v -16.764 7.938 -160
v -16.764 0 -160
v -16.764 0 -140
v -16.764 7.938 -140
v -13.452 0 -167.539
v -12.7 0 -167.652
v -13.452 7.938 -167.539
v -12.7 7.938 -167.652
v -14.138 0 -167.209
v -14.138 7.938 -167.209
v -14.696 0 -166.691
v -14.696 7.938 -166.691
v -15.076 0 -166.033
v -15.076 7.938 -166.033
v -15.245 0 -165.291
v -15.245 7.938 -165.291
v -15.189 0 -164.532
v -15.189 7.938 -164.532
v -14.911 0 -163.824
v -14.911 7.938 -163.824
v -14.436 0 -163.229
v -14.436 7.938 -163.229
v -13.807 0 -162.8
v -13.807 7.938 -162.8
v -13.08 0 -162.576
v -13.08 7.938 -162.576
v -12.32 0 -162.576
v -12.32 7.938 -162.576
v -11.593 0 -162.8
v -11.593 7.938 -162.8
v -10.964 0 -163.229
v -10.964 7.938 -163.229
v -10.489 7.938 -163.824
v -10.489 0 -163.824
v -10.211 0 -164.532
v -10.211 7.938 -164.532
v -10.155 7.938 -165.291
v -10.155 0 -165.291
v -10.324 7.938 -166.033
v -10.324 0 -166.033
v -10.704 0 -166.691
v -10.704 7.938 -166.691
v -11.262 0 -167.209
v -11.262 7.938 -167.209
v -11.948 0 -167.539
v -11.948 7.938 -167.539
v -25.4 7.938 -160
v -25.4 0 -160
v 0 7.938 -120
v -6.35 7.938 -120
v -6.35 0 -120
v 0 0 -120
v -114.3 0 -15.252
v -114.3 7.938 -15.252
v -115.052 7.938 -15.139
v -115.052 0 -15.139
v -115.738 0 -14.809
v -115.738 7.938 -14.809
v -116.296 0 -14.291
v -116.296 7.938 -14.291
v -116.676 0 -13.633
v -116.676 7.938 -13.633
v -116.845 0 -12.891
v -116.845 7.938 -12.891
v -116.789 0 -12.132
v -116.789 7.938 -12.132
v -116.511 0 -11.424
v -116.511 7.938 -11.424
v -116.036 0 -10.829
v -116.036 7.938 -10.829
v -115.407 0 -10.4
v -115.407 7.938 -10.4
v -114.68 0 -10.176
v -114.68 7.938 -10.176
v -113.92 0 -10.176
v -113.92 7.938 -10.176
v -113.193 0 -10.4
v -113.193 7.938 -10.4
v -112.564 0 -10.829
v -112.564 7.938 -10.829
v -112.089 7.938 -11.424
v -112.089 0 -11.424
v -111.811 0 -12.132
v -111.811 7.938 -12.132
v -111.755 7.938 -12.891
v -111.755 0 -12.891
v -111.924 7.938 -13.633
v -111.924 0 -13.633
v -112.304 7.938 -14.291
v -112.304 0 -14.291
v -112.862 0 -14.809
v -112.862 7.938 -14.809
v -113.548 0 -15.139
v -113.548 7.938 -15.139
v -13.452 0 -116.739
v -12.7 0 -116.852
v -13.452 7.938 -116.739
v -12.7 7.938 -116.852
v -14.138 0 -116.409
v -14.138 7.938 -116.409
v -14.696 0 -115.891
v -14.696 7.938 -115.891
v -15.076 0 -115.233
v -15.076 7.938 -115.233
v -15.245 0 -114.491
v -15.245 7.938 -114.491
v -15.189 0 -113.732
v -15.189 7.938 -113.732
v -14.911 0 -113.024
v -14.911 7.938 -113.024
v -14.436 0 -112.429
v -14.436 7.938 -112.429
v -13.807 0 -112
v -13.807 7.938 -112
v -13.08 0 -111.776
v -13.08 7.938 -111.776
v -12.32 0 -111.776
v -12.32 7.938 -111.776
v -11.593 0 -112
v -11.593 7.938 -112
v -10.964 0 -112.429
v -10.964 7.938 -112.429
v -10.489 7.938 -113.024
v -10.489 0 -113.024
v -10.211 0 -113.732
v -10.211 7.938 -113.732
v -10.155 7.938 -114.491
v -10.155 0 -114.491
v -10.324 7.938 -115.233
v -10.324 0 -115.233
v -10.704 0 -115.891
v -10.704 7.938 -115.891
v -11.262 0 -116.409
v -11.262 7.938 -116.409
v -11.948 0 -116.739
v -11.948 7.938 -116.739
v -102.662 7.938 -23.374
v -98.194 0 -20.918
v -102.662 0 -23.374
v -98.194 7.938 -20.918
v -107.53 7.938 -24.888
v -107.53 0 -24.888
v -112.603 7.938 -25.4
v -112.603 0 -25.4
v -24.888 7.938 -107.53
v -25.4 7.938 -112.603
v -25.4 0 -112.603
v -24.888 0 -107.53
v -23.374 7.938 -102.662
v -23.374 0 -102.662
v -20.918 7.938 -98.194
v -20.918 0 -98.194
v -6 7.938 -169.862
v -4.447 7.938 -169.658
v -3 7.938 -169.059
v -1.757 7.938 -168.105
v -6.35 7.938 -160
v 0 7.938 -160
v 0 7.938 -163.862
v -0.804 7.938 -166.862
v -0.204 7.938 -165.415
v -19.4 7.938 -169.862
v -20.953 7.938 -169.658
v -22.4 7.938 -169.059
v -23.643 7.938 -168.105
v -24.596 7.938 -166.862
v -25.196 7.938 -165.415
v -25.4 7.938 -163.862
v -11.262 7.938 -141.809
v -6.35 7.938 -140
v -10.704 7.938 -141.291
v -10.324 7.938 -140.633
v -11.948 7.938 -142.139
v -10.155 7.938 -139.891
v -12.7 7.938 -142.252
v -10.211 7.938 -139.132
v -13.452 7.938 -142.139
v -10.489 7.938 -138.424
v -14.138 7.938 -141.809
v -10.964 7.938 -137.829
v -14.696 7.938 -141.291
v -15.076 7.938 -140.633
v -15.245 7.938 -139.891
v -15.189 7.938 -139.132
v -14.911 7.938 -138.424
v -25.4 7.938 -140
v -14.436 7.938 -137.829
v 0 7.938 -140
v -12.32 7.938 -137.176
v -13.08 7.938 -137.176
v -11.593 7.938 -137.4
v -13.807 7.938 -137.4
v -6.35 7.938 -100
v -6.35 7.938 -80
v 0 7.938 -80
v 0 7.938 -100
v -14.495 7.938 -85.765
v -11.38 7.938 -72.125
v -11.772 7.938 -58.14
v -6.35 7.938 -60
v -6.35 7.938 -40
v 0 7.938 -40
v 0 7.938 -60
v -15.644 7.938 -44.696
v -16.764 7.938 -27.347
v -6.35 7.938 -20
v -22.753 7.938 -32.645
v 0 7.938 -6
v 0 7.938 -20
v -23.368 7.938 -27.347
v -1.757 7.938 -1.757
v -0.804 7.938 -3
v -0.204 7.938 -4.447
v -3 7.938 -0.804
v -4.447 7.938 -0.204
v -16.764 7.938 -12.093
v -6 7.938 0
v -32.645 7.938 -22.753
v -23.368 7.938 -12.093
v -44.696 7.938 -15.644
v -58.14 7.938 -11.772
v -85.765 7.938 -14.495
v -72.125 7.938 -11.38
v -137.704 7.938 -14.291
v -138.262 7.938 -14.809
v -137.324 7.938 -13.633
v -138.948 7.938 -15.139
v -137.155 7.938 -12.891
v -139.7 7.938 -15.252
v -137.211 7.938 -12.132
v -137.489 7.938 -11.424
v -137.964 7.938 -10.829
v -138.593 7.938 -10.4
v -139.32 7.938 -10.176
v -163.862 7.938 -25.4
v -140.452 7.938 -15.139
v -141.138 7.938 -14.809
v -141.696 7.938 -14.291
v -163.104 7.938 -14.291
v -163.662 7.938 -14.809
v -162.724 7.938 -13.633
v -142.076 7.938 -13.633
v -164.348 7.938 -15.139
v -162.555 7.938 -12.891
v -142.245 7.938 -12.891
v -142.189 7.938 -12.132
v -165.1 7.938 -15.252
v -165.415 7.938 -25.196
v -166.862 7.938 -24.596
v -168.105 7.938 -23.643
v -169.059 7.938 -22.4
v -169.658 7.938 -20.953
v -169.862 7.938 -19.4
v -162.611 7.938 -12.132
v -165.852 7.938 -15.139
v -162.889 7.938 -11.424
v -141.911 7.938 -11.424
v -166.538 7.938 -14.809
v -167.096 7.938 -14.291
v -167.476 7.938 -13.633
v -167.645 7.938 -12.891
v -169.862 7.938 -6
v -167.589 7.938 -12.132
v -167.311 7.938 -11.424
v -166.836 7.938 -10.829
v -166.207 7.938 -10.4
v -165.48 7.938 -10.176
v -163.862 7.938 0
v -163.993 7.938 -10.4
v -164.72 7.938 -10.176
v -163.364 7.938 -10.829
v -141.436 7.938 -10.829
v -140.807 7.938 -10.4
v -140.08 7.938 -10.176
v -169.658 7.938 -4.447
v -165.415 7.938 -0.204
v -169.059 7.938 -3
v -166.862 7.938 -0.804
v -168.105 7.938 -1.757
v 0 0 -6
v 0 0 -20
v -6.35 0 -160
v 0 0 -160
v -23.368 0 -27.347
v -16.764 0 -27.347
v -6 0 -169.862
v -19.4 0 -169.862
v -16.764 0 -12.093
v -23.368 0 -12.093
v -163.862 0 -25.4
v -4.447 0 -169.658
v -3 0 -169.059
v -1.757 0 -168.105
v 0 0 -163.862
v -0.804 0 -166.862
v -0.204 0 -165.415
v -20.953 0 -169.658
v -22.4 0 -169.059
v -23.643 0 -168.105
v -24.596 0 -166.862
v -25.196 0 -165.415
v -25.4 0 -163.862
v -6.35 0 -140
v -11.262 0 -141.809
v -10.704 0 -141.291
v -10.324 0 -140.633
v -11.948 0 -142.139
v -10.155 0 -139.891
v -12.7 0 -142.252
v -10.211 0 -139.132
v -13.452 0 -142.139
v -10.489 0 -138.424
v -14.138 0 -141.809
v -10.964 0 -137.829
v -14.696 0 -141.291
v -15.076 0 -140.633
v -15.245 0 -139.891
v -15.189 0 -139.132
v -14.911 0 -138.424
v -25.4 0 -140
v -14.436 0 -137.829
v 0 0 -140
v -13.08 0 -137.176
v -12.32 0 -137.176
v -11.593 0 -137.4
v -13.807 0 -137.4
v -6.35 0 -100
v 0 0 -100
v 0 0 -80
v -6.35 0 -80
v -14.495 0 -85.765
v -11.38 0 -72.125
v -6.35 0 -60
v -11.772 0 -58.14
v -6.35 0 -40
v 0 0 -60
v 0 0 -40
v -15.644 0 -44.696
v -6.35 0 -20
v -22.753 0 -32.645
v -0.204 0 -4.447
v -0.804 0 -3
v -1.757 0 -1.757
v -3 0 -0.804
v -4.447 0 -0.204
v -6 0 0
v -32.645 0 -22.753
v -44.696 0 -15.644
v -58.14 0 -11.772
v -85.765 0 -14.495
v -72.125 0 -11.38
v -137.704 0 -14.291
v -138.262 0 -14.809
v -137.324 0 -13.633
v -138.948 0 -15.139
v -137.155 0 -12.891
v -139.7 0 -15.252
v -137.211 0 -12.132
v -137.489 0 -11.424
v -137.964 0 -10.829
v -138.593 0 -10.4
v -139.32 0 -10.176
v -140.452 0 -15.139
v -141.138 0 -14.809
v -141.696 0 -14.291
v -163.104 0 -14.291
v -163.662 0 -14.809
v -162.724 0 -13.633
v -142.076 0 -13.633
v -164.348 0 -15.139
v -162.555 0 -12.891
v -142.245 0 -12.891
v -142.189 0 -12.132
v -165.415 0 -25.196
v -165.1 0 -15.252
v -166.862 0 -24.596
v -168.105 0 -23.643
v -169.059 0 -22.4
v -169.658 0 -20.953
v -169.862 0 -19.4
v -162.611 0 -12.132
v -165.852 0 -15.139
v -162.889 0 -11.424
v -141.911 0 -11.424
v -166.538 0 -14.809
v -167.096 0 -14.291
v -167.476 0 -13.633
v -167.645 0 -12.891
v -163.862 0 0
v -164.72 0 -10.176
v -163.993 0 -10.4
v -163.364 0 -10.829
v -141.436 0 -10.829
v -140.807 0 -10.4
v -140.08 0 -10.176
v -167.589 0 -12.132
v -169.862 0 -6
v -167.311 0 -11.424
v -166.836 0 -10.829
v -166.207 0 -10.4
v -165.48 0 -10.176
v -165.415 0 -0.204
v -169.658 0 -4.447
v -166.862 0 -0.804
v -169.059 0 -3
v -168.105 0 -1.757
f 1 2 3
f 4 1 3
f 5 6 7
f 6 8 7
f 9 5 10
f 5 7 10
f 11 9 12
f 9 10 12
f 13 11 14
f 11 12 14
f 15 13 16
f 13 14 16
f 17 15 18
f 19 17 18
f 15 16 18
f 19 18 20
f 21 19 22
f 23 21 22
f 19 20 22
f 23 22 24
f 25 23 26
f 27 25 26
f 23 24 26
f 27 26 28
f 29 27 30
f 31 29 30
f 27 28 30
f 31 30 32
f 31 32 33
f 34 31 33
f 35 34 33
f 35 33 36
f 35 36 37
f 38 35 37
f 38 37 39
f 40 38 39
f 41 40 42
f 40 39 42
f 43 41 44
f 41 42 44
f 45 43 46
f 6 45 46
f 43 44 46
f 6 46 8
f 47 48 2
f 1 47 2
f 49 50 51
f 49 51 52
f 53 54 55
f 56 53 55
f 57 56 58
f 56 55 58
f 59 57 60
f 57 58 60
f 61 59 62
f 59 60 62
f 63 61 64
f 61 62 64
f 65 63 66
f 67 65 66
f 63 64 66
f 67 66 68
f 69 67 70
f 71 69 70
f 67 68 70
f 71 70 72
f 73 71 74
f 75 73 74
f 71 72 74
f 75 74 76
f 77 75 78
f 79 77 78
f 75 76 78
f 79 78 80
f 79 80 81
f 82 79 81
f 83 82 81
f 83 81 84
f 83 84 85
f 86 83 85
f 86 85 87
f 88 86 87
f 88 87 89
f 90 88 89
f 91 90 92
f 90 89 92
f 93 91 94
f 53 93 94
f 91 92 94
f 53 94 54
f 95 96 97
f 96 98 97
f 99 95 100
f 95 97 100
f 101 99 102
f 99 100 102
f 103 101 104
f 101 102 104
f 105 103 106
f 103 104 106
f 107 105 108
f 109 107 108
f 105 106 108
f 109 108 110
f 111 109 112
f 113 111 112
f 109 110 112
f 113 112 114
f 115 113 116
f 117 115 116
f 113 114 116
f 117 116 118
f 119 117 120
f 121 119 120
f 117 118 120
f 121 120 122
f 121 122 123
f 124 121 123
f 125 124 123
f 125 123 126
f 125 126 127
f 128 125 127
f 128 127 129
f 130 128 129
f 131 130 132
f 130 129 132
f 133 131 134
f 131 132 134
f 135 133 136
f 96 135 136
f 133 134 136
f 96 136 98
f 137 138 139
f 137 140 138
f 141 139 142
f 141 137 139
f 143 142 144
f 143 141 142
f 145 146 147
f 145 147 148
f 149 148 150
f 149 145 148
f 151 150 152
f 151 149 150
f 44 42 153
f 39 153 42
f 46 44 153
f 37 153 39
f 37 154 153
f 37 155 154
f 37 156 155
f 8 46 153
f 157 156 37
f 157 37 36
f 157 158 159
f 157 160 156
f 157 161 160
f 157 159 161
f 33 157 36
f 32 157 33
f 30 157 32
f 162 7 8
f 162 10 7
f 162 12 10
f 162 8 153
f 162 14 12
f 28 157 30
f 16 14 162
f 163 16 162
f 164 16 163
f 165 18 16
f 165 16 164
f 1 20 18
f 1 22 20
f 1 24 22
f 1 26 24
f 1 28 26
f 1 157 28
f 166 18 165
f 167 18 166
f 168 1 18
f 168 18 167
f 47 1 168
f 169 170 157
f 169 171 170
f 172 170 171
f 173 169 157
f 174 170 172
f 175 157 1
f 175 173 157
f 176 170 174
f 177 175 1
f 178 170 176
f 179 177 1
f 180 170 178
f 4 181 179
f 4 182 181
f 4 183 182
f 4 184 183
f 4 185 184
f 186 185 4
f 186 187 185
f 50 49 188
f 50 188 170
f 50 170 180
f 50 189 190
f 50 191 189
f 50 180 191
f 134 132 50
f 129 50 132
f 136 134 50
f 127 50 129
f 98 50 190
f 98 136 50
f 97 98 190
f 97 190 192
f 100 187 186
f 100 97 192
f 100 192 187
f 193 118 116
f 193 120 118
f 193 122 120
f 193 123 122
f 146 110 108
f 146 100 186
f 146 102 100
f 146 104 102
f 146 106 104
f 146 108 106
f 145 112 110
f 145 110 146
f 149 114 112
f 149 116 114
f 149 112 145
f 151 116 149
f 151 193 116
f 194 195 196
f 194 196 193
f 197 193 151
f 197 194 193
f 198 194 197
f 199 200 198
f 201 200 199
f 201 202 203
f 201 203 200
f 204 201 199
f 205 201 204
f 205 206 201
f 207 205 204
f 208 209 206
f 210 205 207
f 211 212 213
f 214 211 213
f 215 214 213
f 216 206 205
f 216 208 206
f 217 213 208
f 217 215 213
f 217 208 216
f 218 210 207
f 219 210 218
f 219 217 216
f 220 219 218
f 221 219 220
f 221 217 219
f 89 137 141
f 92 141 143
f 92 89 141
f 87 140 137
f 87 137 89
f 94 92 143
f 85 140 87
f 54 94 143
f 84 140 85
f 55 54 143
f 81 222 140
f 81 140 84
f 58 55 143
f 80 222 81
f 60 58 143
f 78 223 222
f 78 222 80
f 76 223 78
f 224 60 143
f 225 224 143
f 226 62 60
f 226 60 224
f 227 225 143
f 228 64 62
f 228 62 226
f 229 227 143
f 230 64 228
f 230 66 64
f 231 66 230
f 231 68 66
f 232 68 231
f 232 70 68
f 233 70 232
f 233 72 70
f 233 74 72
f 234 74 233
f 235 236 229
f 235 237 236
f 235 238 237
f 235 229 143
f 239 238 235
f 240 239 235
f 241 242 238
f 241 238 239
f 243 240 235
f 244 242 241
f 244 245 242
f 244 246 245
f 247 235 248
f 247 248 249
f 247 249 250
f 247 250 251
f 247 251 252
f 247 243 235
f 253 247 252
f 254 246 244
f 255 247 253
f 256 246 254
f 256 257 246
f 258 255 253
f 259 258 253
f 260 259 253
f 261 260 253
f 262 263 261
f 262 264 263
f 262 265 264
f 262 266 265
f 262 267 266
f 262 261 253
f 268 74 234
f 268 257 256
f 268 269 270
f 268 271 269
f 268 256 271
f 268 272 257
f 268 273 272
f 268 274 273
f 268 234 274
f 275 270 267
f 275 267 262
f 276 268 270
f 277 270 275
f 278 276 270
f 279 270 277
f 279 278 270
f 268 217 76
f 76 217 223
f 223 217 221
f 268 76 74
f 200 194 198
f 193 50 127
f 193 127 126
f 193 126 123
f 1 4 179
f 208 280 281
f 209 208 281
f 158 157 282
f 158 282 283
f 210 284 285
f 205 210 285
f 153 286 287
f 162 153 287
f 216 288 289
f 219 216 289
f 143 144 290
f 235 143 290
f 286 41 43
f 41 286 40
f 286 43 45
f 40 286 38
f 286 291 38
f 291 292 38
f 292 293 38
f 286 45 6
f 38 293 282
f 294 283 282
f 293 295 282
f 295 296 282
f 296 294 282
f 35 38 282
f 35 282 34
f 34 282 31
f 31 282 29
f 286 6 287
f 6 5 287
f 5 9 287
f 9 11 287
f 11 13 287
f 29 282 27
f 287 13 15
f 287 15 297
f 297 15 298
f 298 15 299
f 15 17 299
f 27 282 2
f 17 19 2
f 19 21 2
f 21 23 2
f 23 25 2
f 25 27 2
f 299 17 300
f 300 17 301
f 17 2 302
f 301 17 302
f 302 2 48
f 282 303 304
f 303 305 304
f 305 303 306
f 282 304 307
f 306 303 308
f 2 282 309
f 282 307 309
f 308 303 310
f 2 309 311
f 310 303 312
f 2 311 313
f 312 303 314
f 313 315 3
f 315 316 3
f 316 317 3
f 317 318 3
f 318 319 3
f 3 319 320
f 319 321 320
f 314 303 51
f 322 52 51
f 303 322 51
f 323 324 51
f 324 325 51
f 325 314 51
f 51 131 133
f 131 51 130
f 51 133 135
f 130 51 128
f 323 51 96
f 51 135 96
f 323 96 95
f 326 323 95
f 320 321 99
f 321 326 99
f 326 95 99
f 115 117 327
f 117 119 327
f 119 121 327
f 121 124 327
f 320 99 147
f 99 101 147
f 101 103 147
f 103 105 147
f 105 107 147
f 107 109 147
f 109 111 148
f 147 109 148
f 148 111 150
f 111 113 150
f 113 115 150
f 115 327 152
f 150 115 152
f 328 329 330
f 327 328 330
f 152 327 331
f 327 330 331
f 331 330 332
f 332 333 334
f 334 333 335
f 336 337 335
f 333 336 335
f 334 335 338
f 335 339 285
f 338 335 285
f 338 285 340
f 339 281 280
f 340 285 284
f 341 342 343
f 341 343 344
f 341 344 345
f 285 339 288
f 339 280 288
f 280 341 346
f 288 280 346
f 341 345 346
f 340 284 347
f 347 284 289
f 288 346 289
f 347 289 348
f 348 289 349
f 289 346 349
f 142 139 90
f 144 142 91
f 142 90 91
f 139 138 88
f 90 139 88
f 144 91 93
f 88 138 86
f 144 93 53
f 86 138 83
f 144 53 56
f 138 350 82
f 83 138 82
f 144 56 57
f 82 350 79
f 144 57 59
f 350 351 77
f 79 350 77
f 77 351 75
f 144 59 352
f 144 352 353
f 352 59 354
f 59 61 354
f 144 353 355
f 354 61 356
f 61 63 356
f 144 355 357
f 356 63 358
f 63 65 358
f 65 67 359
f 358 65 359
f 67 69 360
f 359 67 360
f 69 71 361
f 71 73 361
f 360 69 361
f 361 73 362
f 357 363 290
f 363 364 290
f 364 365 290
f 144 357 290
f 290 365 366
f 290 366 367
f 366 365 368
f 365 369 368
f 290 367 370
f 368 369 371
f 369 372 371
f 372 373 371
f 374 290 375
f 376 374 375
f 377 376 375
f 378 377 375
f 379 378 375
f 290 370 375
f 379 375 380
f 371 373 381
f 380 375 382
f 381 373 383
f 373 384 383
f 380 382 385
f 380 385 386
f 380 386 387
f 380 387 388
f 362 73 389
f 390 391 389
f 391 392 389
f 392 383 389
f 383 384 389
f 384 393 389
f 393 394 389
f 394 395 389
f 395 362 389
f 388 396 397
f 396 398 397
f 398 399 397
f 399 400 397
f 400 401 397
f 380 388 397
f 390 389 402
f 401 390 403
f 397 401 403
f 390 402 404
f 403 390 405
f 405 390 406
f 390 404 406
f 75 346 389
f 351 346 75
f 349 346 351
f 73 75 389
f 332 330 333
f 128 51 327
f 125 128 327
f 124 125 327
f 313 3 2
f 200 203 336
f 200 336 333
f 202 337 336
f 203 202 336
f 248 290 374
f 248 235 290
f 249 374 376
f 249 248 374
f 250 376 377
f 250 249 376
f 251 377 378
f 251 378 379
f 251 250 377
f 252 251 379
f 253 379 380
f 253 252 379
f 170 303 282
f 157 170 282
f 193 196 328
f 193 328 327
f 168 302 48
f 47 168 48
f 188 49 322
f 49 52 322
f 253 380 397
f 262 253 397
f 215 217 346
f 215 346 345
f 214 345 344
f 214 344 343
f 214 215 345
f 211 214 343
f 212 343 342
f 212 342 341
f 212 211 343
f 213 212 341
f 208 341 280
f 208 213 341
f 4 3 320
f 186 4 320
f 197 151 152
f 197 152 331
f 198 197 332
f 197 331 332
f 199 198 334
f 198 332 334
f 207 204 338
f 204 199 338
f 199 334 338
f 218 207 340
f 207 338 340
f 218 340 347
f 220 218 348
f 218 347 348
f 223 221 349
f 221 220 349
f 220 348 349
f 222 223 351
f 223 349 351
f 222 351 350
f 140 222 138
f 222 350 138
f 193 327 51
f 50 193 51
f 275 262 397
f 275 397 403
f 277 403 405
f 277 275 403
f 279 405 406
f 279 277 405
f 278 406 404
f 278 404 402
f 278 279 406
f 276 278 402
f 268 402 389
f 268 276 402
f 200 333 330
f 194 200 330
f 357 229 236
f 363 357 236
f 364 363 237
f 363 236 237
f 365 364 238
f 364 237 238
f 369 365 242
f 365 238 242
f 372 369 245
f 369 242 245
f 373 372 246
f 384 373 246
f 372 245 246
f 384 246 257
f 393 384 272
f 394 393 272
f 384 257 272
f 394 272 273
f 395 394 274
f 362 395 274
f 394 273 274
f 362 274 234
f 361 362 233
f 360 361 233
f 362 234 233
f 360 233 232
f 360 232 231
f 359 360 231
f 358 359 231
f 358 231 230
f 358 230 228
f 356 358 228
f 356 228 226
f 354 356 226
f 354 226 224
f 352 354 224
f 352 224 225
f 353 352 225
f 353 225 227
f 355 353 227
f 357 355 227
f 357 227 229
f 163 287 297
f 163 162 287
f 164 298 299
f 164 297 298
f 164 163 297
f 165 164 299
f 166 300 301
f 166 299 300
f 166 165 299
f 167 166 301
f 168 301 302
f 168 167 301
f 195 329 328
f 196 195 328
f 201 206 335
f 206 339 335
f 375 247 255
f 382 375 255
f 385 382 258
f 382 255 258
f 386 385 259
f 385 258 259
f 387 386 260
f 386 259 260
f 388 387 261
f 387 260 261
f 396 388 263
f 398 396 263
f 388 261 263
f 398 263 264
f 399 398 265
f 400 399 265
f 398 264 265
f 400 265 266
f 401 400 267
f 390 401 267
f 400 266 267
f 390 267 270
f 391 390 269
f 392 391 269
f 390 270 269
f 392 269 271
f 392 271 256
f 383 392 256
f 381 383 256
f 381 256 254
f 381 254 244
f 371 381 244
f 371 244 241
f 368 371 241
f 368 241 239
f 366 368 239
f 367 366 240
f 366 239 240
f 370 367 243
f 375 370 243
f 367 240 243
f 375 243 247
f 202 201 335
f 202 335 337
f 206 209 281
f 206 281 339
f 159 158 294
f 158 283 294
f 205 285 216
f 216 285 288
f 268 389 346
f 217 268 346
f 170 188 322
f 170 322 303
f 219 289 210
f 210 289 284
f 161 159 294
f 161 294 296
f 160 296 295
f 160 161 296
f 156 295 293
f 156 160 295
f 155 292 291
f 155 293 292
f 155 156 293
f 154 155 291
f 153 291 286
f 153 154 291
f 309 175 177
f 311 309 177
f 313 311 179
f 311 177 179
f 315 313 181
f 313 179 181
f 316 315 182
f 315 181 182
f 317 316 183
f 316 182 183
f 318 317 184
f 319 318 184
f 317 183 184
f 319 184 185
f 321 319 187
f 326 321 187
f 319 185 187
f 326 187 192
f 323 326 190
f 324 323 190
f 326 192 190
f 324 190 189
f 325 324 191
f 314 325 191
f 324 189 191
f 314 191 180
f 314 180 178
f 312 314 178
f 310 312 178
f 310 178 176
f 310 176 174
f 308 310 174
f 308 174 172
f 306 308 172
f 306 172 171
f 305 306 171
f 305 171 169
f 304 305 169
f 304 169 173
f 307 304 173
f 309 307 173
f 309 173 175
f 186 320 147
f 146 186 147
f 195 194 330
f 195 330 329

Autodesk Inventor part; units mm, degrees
ref_plane "YZ Plane" through (0, 0, 0) normal (1, 0, 0) x (0, 1, 0)
ref_plane "XZ Plane" through (0, 0, 0) normal (0, 1, 0) x (-1, 0, 0)
ref_plane "XY Plane" through (0, 0, 0) normal (0, 0, 1) x (1, 0, 0)
sketch "Sketch1" plane through (0, 0, 0) normal (0, 1, 0) x (-1, 0, 0)
  line L0 (169.8625, 0) -> (0, 0)
  line L1 (0, 0) -> (0, -169.8625)
  line L2 (0, -169.8625) -> (25.4, -169.8625)
  line L3 (25.4, -169.8625) -> (25.4, -103.8713)
  line L4 (103.8713, -25.4) -> (169.8625, -25.4)
  line L5 (169.8625, -25.4) -> (169.8625, 0)
  arc A0 (103.8713, -25.4) -> (25.4, -103.8713) centre (66.675, -66.675) ccw
  line L6 (0, 0) -> (66.675, -66.675) construction
  line L7 (0, -20) -> (6.35, -20)
  line L8 (6.35, -20) -> (6.35, -40)
  line L9 (6.35, -40) -> (0, -40)
  line L10 (0, -40) -> (0, -20)
  line L11 (6.35, -60) -> (6.35, -80)
  line L12 (0, -60) -> (6.35, -60)
  line L13 (6.35, -80) -> (0, -80)
  line L14 (6.35, -100) -> (6.35, -120)
  line L15 (0, -100) -> (6.35, -100)
  line L16 (6.35, -120) -> (0, -120)
  line L17 (6.35, -140) -> (6.35, -160)
  line L18 (0, -140) -> (6.35, -140)
  line L19 (6.35, -160) -> (0, -160)
  line L20 (23.368, -27.3469) -> (16.764, -27.3469)
  line L21 (16.764, -27.3469) -> (16.764, -12.0929)
  line L22 (16.764, -12.0929) -> (23.368, -12.0929)
  line L23 (23.368, -12.0929) -> (23.368, -27.3469)
  line L24 (23.368, -27.3469) -> (16.764, -12.0929) construction
  line L25 (16.764, -27.3469) -> (23.368, -12.0929) construction
  line L26 (25.4, -160) -> (16.764, -160)
  line L27 (16.764, -160) -> (16.764, -140)
  line L28 (16.764, -140) -> (25.4, -140)
  point P0 (103.8713, -25.4)
  point P1 (20.066, -19.7199)
  point P2 (20.066, -12.0929)
  dimension "d0" = 25.4
  dimension "d1" = 169.8625
  dimension "d2" = 25.4
  dimension "d3" = 169.8625
  dimension "d4" = 111.125
  dimension "d5" = 66.675
  dimension "d6" = 45
  dimension "d10" = 6.35
  dimension "d11" = 20
  dimension "d12" = 20
  dimension "d15" = 40
  dimension "d34" = 12.0929
  dimension "d35" = 6.604
  dimension "d36" = 20.066
  dimension "d37" = 15.254
extrude "Plate1" add sketch "Sketch1" along normal blind 7.9375 contours L5 L4 A0 L3 L28 L27 L26 L2 L1 L19 L17 L18 L16 L14 L15 L13 L11 L12 L9 L8 L7 L0
fillet "Corner Round1" radius 25.4 2 edges at (-103.8713, 3.9688, -25.4) (-25.4, 3.9688, -103.8713)
fillet "Corner Round2" radius 6 5 edges at (0, 3.9688, 0) (0, 3.9688, -169.8625) (-25.4, 3.9688, -169.8625) (-169.8625, 3.9688, 0) (-169.8625, 3.9688, -25.4)
sketch "Sketch2" plane through (0, 0, 0) normal (0, -1, 0) x (1, 0, 0)
  line L0 (-169.8625, -19.4) -> (-169.8625, -6) projected
  line L1 (-19.4, -169.8625) -> (-6, -169.8625) projected
  line L2 (-6, -169.8625) -> (-19.4, -169.8625) projected
  point P0 (0, 0)
  point P1 (-165.1, -12.7)
  point P2 (-139.7, -12.7)
  point P3 (-114.3, -12.7)
  point P4 (-12.7, -165.1)
  point P5 (-12.7, -139.7)
  point P6 (-12.7, -114.3)
  point P7 (-169.8625, -12.7)
  point P8 (-169.8625, -12.7)
  point P9 (-12.7, -169.8625)
  dimension "d21" = 25.4
  dimension "d22" = 25.4
  dimension "d23" = 25.4
  dimension "d24" = 25.4
  dimension "d25" = 4.7625
  dimension "d26" = 4.7625
hole "Hole1" at (-165.1, 0, -12.7) at (-139.7, 0, -12.7) at (-114.3, 0, -12.7) at (-12.7, 0, -165.1) at (-12.7, 0, -139.7) at (-12.7, 0, -114.3) direction (0, 1, 0) diameter 5.105 depth 7.9375 tip angle 118 clearance for "Flat Head Machine Screw (82)" size "#10" standard "Ansi Unified Screw Threads"
equation "\"d22\" = d21"
equation "\"d23\" = d21"
equation "\"d24\" = d23"
equation "\"d2\" = d0"
equation "\"d3\" = d1"
equation "\"d12\" = d11"
equation "\"d15\" = 2 * d11"
equation "\"d32\" = Thickness"
equation "\"d8\" = Thickness"
equation "\"BendRadius\" = Thickness"
equation "\"BendReliefWidth\" = Thickness"
equation "\"BendReliefDepth\" = 0.5 * Thickness"
equation "\"CornerReliefSize\" = 4 * Thickness"
equation "\"MinimumRemnant\" = 2 * Thickness"
equation "\"TransitionRadius\" = BendRadius"
equation "\"JacobiRadiusSize\" = BendRadius"
equation "\"GapSize\" = Thickness"
equation "\"Thickness\" = 7.9375"
properties part number "INTAKE_SWERVE_MOUNT" material "Aluminum, 6061-T6"
